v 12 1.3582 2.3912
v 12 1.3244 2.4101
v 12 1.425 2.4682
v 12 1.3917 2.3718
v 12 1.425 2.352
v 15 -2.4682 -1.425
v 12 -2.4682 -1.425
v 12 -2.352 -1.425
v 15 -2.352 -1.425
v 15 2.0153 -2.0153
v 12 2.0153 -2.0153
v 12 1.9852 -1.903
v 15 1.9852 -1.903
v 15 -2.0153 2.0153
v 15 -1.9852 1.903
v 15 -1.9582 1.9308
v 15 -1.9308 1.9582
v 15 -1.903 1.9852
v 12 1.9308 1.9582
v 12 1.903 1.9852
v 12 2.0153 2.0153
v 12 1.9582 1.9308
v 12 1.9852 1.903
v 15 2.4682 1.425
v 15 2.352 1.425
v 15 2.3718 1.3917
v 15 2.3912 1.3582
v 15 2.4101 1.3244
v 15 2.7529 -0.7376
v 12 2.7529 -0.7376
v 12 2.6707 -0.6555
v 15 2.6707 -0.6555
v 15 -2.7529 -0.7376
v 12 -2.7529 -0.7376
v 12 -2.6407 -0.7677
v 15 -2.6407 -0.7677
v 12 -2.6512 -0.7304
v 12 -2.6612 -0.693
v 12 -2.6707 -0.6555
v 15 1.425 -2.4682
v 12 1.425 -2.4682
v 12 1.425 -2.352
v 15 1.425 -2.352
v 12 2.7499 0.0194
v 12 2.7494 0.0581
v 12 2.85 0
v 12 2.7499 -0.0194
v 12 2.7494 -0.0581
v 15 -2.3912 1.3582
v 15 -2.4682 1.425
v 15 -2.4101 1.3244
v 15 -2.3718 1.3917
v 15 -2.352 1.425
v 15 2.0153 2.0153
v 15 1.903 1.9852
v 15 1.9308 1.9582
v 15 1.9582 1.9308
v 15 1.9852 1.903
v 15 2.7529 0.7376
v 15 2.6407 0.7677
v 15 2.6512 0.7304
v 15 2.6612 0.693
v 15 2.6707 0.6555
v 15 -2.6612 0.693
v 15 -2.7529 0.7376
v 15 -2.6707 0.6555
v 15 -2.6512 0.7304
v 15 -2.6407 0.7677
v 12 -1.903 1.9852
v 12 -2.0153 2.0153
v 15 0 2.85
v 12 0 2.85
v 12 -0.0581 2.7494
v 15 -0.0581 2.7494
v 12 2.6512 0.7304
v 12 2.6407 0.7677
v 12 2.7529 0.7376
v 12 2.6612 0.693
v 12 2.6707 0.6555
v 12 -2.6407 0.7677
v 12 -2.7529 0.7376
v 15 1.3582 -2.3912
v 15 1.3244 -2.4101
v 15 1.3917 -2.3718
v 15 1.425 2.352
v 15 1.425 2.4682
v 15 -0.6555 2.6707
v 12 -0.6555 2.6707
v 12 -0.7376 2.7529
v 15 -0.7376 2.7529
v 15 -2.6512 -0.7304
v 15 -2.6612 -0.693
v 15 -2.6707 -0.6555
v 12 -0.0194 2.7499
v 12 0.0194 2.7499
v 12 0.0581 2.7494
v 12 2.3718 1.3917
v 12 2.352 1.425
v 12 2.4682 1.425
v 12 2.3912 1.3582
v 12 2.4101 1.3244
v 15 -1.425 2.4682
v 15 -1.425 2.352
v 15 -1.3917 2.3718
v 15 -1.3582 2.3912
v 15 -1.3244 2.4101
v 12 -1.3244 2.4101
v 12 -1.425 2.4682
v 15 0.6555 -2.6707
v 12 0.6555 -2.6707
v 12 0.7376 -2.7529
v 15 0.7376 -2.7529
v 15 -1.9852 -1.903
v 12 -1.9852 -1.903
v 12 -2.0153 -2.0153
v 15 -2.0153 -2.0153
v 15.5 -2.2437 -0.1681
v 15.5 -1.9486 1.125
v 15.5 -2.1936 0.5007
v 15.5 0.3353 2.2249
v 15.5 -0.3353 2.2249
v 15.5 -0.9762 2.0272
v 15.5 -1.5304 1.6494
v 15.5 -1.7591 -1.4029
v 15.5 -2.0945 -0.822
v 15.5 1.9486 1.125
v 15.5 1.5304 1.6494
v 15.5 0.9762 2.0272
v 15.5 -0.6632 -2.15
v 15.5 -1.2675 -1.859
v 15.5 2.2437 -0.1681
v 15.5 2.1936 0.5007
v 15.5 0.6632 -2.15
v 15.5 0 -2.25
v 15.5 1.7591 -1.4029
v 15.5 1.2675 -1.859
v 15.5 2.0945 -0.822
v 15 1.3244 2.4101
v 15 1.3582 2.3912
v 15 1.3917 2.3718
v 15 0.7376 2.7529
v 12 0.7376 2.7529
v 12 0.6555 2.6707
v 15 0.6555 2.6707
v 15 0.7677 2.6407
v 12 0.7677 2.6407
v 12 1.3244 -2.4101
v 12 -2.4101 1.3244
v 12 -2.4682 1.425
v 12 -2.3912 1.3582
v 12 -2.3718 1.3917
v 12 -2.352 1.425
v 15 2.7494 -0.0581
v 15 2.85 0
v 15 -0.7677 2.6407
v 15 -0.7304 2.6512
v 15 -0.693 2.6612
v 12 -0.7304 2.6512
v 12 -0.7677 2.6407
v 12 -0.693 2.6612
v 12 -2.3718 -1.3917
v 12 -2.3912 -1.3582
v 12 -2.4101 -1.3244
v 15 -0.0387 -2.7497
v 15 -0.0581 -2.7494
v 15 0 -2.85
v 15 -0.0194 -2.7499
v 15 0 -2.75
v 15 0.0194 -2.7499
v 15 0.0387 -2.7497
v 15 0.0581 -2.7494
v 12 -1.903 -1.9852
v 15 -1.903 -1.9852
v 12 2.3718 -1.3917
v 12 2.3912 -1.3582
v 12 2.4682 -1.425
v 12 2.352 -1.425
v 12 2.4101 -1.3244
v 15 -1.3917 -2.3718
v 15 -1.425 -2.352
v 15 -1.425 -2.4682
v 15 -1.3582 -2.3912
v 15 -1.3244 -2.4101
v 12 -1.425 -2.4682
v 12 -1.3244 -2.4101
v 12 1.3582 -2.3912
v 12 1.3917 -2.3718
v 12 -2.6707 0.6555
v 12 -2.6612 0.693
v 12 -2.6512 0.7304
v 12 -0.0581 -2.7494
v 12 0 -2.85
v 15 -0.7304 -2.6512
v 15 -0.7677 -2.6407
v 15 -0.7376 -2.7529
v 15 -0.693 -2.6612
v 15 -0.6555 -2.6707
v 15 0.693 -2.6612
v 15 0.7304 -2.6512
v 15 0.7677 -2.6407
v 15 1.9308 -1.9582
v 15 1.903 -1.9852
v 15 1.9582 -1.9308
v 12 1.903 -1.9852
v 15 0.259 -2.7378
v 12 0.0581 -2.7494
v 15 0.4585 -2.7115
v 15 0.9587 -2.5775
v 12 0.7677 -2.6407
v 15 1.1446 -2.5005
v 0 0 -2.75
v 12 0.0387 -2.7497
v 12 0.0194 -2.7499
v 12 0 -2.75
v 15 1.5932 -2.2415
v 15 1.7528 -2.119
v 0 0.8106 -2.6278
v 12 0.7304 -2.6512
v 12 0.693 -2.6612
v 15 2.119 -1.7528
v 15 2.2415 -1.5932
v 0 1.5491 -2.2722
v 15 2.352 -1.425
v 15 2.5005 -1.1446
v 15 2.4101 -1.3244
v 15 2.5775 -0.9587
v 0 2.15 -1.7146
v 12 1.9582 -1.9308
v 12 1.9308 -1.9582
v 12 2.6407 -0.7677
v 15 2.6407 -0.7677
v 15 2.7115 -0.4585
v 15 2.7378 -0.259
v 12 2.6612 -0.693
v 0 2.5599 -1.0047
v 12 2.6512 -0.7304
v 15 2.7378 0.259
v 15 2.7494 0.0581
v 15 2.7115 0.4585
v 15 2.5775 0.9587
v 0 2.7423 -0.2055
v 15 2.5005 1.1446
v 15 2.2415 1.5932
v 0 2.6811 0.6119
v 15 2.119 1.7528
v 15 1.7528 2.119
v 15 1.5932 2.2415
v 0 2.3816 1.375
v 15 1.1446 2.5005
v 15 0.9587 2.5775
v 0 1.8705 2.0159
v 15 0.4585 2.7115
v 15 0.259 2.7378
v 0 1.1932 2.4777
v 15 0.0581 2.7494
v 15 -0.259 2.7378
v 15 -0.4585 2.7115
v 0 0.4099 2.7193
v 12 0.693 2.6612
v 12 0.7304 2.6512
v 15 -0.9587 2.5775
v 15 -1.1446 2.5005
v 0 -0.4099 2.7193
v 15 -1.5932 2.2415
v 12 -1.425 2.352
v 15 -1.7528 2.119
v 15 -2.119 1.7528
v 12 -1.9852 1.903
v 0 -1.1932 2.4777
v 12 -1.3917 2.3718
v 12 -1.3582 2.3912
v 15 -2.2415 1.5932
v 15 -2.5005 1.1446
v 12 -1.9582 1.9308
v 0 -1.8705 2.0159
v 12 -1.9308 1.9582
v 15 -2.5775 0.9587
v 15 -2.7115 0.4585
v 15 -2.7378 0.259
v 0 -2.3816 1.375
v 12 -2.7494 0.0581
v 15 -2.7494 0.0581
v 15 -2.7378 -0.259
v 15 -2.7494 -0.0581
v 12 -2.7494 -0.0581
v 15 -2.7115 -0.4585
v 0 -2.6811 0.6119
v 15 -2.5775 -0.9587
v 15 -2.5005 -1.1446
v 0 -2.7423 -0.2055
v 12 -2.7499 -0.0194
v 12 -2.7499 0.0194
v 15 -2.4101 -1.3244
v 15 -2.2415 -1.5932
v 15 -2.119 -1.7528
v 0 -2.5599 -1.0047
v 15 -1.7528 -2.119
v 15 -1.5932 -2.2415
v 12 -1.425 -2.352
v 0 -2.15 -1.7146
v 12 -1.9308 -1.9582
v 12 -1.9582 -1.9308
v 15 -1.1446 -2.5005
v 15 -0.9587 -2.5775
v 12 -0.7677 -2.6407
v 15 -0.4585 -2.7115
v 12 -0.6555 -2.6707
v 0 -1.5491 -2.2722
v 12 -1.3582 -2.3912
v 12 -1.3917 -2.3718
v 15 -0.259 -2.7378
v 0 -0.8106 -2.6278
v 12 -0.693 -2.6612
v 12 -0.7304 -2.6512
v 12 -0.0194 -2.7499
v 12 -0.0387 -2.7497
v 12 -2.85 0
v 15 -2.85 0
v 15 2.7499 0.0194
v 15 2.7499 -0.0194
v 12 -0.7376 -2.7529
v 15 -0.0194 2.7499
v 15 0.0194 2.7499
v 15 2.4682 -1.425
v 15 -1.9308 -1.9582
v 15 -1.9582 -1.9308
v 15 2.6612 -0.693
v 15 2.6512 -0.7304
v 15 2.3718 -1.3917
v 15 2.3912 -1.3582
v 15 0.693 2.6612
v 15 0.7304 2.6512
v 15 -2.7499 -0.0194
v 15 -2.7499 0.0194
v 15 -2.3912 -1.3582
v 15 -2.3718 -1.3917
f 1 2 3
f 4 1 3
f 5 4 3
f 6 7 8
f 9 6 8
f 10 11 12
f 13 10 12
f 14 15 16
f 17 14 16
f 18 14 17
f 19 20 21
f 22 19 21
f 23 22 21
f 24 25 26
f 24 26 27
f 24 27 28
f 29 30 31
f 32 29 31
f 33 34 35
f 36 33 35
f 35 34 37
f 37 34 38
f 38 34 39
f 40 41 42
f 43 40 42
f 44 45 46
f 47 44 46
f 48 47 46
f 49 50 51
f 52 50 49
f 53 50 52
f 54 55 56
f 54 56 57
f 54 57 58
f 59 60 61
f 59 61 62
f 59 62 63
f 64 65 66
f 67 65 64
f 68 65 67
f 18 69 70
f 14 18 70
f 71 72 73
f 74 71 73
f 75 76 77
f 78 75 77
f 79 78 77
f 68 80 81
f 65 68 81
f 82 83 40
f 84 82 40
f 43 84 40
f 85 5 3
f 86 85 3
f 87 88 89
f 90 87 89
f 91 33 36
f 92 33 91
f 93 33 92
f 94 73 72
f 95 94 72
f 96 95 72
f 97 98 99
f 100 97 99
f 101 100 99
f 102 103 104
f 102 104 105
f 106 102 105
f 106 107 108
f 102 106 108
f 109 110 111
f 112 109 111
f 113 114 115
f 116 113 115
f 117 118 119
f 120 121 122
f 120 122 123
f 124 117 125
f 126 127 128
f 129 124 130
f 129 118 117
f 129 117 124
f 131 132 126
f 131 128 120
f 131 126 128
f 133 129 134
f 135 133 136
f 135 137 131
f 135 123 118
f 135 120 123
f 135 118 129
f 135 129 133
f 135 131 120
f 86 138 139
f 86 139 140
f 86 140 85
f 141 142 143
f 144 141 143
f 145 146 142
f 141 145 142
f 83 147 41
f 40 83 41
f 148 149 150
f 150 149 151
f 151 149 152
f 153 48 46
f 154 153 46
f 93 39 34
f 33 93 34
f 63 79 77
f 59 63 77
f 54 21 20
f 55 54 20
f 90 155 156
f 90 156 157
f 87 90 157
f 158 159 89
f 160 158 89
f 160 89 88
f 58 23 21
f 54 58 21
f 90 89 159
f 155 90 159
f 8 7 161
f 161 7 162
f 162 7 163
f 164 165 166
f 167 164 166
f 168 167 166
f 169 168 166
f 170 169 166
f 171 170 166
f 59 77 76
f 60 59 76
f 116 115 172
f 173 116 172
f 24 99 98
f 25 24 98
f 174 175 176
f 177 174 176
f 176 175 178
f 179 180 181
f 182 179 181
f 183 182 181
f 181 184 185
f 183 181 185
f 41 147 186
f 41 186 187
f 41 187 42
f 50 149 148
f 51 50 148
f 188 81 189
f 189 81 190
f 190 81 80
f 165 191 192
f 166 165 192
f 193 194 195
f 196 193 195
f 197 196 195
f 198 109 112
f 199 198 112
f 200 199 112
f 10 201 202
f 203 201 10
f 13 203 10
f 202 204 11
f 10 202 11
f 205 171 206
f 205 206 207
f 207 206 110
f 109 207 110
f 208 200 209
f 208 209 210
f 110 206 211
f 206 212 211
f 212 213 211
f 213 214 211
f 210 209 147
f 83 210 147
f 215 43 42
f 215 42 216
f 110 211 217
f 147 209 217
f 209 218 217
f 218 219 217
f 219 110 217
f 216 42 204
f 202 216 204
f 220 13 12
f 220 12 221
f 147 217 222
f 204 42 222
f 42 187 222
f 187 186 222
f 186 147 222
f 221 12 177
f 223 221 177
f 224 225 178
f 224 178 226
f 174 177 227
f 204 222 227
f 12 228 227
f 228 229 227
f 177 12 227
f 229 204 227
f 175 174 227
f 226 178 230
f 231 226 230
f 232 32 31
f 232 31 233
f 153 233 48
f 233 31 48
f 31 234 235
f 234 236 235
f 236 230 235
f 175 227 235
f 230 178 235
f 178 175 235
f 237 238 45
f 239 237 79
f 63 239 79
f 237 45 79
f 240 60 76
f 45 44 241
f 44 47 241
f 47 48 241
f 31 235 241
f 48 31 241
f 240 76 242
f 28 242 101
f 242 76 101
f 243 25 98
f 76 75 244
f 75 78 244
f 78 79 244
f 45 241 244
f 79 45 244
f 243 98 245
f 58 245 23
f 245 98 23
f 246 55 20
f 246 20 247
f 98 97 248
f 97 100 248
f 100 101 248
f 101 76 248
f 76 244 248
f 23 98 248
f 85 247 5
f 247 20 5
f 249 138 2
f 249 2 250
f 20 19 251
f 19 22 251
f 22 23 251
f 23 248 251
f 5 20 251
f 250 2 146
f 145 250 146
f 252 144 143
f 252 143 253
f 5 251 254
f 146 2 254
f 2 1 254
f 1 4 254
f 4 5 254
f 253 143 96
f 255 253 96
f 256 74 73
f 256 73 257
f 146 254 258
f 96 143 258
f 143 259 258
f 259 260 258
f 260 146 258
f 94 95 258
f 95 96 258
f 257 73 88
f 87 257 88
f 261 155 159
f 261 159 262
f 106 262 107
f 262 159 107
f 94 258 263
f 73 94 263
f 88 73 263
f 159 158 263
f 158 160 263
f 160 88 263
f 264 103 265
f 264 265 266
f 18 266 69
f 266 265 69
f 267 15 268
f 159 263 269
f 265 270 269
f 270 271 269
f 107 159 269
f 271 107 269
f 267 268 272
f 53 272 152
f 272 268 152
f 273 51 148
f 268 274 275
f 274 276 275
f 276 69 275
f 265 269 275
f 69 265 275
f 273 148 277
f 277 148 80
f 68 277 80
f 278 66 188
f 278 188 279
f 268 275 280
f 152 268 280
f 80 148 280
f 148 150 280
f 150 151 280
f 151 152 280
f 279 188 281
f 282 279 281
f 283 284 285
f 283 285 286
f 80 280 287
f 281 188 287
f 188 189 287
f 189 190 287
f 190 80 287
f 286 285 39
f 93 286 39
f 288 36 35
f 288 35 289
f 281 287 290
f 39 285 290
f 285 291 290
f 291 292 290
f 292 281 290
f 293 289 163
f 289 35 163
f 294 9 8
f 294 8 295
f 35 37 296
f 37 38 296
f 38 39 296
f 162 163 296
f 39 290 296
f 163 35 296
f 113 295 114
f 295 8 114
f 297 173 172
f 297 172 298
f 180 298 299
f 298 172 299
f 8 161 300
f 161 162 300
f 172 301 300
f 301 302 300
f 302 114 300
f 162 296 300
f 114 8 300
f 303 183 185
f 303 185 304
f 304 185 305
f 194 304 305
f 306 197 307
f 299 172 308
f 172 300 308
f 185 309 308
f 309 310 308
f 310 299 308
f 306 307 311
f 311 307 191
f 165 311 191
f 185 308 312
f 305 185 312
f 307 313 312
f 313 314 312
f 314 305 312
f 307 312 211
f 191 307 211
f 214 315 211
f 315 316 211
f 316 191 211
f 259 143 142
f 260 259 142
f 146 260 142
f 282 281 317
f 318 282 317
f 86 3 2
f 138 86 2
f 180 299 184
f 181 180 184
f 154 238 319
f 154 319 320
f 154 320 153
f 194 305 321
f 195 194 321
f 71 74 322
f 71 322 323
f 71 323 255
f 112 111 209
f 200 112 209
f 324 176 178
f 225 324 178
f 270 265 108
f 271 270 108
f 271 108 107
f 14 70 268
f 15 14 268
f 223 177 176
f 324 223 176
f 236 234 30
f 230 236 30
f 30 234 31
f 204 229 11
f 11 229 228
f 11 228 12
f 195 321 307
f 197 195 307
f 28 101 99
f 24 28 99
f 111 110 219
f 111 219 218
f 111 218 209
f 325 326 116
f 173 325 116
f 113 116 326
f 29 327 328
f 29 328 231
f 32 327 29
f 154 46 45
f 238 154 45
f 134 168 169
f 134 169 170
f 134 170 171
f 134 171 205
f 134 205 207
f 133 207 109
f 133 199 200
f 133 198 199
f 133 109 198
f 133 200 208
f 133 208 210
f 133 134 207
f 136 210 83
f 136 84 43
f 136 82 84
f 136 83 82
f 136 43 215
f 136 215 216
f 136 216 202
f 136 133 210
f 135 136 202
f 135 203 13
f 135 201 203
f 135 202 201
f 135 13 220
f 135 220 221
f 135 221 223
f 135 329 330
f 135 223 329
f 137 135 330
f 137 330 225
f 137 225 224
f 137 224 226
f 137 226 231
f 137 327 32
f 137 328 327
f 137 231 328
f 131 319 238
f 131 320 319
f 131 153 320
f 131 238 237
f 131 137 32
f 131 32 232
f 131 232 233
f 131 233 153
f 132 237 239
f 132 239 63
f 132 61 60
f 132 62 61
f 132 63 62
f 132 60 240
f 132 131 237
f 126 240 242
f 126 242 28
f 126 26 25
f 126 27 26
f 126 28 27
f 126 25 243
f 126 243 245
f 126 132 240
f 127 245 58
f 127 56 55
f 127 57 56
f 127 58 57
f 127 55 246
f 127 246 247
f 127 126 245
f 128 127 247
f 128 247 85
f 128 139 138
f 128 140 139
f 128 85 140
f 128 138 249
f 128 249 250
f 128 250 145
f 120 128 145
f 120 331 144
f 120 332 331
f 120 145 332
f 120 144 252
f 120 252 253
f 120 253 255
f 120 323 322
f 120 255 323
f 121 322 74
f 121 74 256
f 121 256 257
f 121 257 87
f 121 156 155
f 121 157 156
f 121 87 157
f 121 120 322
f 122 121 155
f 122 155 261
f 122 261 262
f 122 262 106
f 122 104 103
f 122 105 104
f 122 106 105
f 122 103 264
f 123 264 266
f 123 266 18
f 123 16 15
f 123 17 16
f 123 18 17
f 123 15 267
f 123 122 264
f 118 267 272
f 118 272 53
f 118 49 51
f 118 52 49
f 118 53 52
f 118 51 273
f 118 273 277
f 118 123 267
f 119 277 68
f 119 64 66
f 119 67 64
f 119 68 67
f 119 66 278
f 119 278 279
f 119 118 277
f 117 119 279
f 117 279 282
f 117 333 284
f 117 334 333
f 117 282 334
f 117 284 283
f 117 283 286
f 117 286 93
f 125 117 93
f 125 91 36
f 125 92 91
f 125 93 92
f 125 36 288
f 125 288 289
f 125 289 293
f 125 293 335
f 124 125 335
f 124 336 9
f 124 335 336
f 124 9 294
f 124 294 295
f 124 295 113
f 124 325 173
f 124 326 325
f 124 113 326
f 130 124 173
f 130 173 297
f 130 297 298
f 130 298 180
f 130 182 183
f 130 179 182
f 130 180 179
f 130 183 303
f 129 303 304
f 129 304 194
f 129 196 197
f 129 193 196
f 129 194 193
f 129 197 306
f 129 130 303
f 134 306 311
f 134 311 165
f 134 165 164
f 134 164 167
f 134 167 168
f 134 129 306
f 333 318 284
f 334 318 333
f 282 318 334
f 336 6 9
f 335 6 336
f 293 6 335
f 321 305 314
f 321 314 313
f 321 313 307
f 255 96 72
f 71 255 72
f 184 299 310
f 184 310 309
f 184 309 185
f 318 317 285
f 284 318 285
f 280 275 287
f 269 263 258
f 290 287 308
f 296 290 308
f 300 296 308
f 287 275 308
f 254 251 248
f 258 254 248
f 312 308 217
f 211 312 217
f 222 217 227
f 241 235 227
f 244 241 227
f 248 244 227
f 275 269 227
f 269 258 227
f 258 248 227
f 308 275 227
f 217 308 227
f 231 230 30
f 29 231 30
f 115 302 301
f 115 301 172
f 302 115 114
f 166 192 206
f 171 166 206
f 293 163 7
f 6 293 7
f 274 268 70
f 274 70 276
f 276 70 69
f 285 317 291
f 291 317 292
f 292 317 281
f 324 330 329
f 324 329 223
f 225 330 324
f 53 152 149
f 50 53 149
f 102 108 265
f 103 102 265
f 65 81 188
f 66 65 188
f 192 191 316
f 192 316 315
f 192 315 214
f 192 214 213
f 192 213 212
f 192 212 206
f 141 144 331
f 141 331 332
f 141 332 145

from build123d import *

# Parameters (mm, degrees)
SKETCH1_R           = 2.75
BOSS_EXTRUDE1_DEPTH = 15.5
CHAMFER1_SIZE       = 0.5
BOSS_EXTRUDE2_START = -3
BOSS_EXTRUDE2_DEPTH = 3
CIRPATTERN1_START   = 12
CIRPATTERN1_DEPTH   = 3


# Read off the part's stored shape, not the designer's step: CirPattern1
with BuildPart() as part:
    # Sketch1 → Boss-Extrude1 (new body)
    with BuildSketch(Plane(origin=(0, 0, 0), x_dir=(0, 0, -1), z_dir=(1, 0, 0))):
        Circle(SKETCH1_R)
    extrude(amount=BOSS_EXTRUDE1_DEPTH)

    # Chamfer1
    chamfer1_edges = [part.edges().sort_by_distance(p)[0] for p in [
        (15.5, 0, 2.75),
    ]]
    chamfer(chamfer1_edges, length=CHAMFER1_SIZE)

    # Sketch2 → Boss-Extrude2 (add)
    with BuildSketch(Plane(origin=(15, 0, 0), x_dir=(0, 0, -1), z_dir=(1, 0, 0)).offset(BOSS_EXTRUDE2_START)):
        with BuildLine():
            Line((0, 2.85), (-0.058089283, 2.749386411))
            ThreePointArc((-0.058089283, 2.749386411), (0, 2.75), (0.058089283, 2.749386411))
            Line((0.058089283, 2.749386411), (0, 2.85))
        make_face()
    extrude(amount=BOSS_EXTRUDE2_DEPTH)

    # CirPattern1 outline → CirPattern1 (add)
    with BuildSketch(Plane.YZ.offset(CIRPATTERN1_START)):
        with BuildLine():
            Line((-1.425, -2.351993835), (-1.425, -2.468172401))
            Line((-1.425, -2.468172401), (-1.324386411, -2.410083118))
            ThreePointArc((-1.324386411, -2.410083118), (-1.375, -2.38156986), (-1.425, -2.351993835))
        make_face()
        with BuildLine():
            ThreePointArc((-0.655483627, -2.670737953), (-0.711752374, -2.656296022), (-0.767703504, -2.640668728))
            Line((-0.767703504, -2.640668728), (-0.737634279, -2.752888605))
            Line((-0.737634279, -2.752888605), (-0.655483627, -2.670737953))
        make_face()
        with BuildLine():
            Line((-2.015254326, -2.015254326), (-1.903034449, -1.985185101))
            ThreePointArc((-1.903034449, -1.985185101), (-1.944543648, -1.944543648), (-1.985185101, -1.903034449))
            Line((-1.985185101, -1.903034449), (-2.015254326, -2.015254326))
        make_face()
        with BuildLine():
            ThreePointArc((0.058089283, -2.749386411), (0, -2.75), (-0.058089283, -2.749386411))
            Line((-0.058089283, -2.749386411), (0, -2.85))
            Line((0, -2.85), (0.058089283, -2.749386411))
        make_face()
        with BuildLine():
            Line((-2.468172401, -1.425), (-2.351993835, -1.425))
            ThreePointArc((-2.351993835, -1.425), (-2.38156986, -1.375), (-2.410083118, -1.324386411))
            Line((-2.410083118, -1.324386411), (-2.468172401, -1.425))
        make_face()
        with BuildLine():
            ThreePointArc((0.767703504, -2.640668728), (0.711752374, -2.656296022), (0.655483627, -2.670737953))
            Line((0.655483627, -2.670737953), (0.737634279, -2.752888605))
            Line((0.737634279, -2.752888605), (0.767703504, -2.640668728))
        make_face()
        with BuildLine():
            Line((-2.752888605, -0.737634279), (-2.640668728, -0.767703504))
            ThreePointArc((-2.640668728, -0.767703504), (-2.656296022, -0.711752374), (-2.670737953, -0.655483627))
            Line((-2.670737953, -0.655483627), (-2.752888605, -0.737634279))
        make_face()
        with BuildLine():
            ThreePointArc((1.425, -2.351993835), (1.375, -2.38156986), (1.324386411, -2.410083118))
            Line((1.324386411, -2.410083118), (1.425, -2.468172401))
            Line((1.425, -2.468172401), (1.425, -2.351993835))
        make_face()
        with BuildLine():
            Line((-2.85, 0), (-2.749386411, -0.058089283))
            ThreePointArc((-2.749386411, -0.058089283), (-2.75, 0), (-2.749386411, 0.058089283))
            Line((-2.749386411, 0.058089283), (-2.85, 0))
        make_face()
        with BuildLine():
            ThreePointArc((1.985185101, -1.903034449), (1.944543648, -1.944543648), (1.903034449, -1.985185101))
            Line((1.903034449, -1.985185101), (2.015254326, -2.015254326))
            Line((2.015254326, -2.015254326), (1.985185101, -1.903034449))
        make_face()
        with BuildLine():
            Line((-2.752888605, 0.737634279), (-2.670737953, 0.655483627))
            ThreePointArc((-2.670737953, 0.655483627), (-2.656296022, 0.711752374), (-2.640668728, 0.767703504))
            Line((-2.640668728, 0.767703504), (-2.752888605, 0.737634279))
        make_face()
        with BuildLine():
            ThreePointArc((2.410083118, -1.324386411), (2.38156986, -1.375), (2.351993835, -1.425))
            Line((2.351993835, -1.425), (2.468172401, -1.425))
            Line((2.468172401, -1.425), (2.410083118, -1.324386411))
        make_face()
        with BuildLine():
            Line((-2.468172401, 1.425), (-2.410083118, 1.324386411))
            ThreePointArc((-2.410083118, 1.324386411), (-2.38156986, 1.375), (-2.351993835, 1.425))
            Line((-2.351993835, 1.425), (-2.468172401, 1.425))
        make_face()
        with BuildLine():
            ThreePointArc((2.670737953, -0.655483627), (2.656296022, -0.711752374), (2.640668728, -0.767703504))
            Line((2.640668728, -0.767703504), (2.752888605, -0.737634279))
            Line((2.752888605, -0.737634279), (2.670737953, -0.655483627))
        make_face()
        with BuildLine():
            Line((-2.015254326, 2.015254326), (-1.985185101, 1.903034449))
            ThreePointArc((-1.985185101, 1.903034449), (-1.944543648, 1.944543648), (-1.903034449, 1.985185101))
            Line((-1.903034449, 1.985185101), (-2.015254326, 2.015254326))
        make_face()
        with BuildLine():
            Line((-1.425, 2.468172401), (-1.425, 2.351993835))
            ThreePointArc((-1.425, 2.351993835), (-1.375, 2.38156986), (-1.324386411, 2.410083118))
            Line((-1.324386411, 2.410083118), (-1.425, 2.468172401))
        make_face()
        with BuildLine():
            ThreePointArc((2.640668728, 0.767703504), (2.656296022, 0.711752374), (2.670737953, 0.655483627))
            Line((2.670737953, 0.655483627), (2.752888605, 0.737634279))
            Line((2.752888605, 0.737634279), (2.640668728, 0.767703504))
        make_face()
        with BuildLine():
            Line((-0.737634279, 2.752888605), (-0.767703504, 2.640668728))
            ThreePointArc((-0.767703504, 2.640668728), (-0.711752374, 2.656296022), (-0.655483627, 2.670737953))
            Line((-0.655483627, 2.670737953), (-0.737634279, 2.752888605))
        make_face()
        with BuildLine():
            ThreePointArc((2.351993835, 1.425), (2.38156986, 1.375), (2.410083118, 1.324386411))
            Line((2.410083118, 1.324386411), (2.468172401, 1.425))
            Line((2.468172401, 1.425), (2.351993835, 1.425))
        make_face()
        with BuildLine():
            Line((0, 2.85), (-0.058089283, 2.749386411))
            ThreePointArc((-0.058089283, 2.749386411), (0, 2.75), (0.058089283, 2.749386411))
            Line((0.058089283, 2.749386411), (0, 2.85))
        make_face()
        with BuildLine():
            ThreePointArc((1.903034449, 1.985185101), (1.944543648, 1.944543648), (1.985185101, 1.903034449))
            Line((1.985185101, 1.903034449), (2.015254326, 2.015254326))
            Line((2.015254326, 2.015254326), (1.903034449, 1.985185101))
        make_face()
        with BuildLine():
            Line((0.737634279, 2.752888605), (0.655483627, 2.670737953))
            ThreePointArc((0.655483627, 2.670737953), (0.711752374, 2.656296022), (0.767703504, 2.640668728))
            Line((0.767703504, 2.640668728), (0.737634279, 2.752888605))
        make_face()
        with BuildLine():
            ThreePointArc((1.324386411, 2.410083118), (1.375, 2.38156986), (1.425, 2.351993835))
            Line((1.425, 2.351993835), (1.425, 2.468172401))
            Line((1.425, 2.468172401), (1.324386411, 2.410083118))
        make_face()
    extrude(amount=CIRPATTERN1_DEPTH)


solid = part.part
